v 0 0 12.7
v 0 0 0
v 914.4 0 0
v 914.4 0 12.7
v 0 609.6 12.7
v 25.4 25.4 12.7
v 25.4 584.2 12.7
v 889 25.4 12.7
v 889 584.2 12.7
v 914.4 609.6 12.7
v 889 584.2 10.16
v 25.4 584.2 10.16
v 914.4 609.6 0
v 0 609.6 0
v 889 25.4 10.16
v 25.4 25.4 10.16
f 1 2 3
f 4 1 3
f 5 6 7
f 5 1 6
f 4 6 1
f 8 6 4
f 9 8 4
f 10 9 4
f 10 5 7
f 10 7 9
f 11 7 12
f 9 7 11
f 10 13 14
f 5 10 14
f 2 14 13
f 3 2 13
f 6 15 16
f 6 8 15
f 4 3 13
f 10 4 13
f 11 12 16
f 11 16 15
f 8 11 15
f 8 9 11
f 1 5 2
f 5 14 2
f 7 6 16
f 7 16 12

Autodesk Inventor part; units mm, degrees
ref_plane "YZ Plane" through (0, 0, 0) normal (1, 0, 0) x (0, 1, 0)
ref_plane "XZ Plane" through (0, 0, 0) normal (0, 1, 0) x (-1, 0, 0)
ref_plane "XY Plane" through (0, 0, 0) normal (0, 0, 1) x (1, 0, 0)
sketch "Sketch1" plane through (0, 0, 0) normal (0, 0, 1) x (1, 0, 0)
  line L0 (0, 0) -> (914.4, 0)
  line L1 (914.4, 0) -> (914.4, 609.6)
  line L2 (914.4, 609.6) -> (0, 609.6)
  line L3 (0, 609.6) -> (0, 0)
  dimension "d0" = 914.4
  dimension "d1" = 609.6
extrude "Extrusion1" add sketch "Sketch1" along normal blind 12.7
sketch "Sketch2" plane through (0, 0, 12.7) normal (0, 0, 1) x (1, 0, 0)
  line L0 (0, 609.6) -> (0, 0) projected
  line L1 (914.4, 609.6) -> (0, 609.6) projected
  line L2 (0, 0) -> (914.4, 0) projected
  line L3 (914.4, 0) -> (914.4, 609.6) projected
  line L4 (889, 25.4) -> (25.4, 25.4)
  line L5 (25.4, 25.4) -> (25.4, 584.2)
  line L6 (25.4, 584.2) -> (889, 584.2)
  line L7 (889, 584.2) -> (889, 25.4)
  dimension "d4" = 25.4
extrude "Extrusion2" cut sketch "Sketch2" against normal blind 2.54 contours L4 L5 L6 L7
properties part number "Ship area"
